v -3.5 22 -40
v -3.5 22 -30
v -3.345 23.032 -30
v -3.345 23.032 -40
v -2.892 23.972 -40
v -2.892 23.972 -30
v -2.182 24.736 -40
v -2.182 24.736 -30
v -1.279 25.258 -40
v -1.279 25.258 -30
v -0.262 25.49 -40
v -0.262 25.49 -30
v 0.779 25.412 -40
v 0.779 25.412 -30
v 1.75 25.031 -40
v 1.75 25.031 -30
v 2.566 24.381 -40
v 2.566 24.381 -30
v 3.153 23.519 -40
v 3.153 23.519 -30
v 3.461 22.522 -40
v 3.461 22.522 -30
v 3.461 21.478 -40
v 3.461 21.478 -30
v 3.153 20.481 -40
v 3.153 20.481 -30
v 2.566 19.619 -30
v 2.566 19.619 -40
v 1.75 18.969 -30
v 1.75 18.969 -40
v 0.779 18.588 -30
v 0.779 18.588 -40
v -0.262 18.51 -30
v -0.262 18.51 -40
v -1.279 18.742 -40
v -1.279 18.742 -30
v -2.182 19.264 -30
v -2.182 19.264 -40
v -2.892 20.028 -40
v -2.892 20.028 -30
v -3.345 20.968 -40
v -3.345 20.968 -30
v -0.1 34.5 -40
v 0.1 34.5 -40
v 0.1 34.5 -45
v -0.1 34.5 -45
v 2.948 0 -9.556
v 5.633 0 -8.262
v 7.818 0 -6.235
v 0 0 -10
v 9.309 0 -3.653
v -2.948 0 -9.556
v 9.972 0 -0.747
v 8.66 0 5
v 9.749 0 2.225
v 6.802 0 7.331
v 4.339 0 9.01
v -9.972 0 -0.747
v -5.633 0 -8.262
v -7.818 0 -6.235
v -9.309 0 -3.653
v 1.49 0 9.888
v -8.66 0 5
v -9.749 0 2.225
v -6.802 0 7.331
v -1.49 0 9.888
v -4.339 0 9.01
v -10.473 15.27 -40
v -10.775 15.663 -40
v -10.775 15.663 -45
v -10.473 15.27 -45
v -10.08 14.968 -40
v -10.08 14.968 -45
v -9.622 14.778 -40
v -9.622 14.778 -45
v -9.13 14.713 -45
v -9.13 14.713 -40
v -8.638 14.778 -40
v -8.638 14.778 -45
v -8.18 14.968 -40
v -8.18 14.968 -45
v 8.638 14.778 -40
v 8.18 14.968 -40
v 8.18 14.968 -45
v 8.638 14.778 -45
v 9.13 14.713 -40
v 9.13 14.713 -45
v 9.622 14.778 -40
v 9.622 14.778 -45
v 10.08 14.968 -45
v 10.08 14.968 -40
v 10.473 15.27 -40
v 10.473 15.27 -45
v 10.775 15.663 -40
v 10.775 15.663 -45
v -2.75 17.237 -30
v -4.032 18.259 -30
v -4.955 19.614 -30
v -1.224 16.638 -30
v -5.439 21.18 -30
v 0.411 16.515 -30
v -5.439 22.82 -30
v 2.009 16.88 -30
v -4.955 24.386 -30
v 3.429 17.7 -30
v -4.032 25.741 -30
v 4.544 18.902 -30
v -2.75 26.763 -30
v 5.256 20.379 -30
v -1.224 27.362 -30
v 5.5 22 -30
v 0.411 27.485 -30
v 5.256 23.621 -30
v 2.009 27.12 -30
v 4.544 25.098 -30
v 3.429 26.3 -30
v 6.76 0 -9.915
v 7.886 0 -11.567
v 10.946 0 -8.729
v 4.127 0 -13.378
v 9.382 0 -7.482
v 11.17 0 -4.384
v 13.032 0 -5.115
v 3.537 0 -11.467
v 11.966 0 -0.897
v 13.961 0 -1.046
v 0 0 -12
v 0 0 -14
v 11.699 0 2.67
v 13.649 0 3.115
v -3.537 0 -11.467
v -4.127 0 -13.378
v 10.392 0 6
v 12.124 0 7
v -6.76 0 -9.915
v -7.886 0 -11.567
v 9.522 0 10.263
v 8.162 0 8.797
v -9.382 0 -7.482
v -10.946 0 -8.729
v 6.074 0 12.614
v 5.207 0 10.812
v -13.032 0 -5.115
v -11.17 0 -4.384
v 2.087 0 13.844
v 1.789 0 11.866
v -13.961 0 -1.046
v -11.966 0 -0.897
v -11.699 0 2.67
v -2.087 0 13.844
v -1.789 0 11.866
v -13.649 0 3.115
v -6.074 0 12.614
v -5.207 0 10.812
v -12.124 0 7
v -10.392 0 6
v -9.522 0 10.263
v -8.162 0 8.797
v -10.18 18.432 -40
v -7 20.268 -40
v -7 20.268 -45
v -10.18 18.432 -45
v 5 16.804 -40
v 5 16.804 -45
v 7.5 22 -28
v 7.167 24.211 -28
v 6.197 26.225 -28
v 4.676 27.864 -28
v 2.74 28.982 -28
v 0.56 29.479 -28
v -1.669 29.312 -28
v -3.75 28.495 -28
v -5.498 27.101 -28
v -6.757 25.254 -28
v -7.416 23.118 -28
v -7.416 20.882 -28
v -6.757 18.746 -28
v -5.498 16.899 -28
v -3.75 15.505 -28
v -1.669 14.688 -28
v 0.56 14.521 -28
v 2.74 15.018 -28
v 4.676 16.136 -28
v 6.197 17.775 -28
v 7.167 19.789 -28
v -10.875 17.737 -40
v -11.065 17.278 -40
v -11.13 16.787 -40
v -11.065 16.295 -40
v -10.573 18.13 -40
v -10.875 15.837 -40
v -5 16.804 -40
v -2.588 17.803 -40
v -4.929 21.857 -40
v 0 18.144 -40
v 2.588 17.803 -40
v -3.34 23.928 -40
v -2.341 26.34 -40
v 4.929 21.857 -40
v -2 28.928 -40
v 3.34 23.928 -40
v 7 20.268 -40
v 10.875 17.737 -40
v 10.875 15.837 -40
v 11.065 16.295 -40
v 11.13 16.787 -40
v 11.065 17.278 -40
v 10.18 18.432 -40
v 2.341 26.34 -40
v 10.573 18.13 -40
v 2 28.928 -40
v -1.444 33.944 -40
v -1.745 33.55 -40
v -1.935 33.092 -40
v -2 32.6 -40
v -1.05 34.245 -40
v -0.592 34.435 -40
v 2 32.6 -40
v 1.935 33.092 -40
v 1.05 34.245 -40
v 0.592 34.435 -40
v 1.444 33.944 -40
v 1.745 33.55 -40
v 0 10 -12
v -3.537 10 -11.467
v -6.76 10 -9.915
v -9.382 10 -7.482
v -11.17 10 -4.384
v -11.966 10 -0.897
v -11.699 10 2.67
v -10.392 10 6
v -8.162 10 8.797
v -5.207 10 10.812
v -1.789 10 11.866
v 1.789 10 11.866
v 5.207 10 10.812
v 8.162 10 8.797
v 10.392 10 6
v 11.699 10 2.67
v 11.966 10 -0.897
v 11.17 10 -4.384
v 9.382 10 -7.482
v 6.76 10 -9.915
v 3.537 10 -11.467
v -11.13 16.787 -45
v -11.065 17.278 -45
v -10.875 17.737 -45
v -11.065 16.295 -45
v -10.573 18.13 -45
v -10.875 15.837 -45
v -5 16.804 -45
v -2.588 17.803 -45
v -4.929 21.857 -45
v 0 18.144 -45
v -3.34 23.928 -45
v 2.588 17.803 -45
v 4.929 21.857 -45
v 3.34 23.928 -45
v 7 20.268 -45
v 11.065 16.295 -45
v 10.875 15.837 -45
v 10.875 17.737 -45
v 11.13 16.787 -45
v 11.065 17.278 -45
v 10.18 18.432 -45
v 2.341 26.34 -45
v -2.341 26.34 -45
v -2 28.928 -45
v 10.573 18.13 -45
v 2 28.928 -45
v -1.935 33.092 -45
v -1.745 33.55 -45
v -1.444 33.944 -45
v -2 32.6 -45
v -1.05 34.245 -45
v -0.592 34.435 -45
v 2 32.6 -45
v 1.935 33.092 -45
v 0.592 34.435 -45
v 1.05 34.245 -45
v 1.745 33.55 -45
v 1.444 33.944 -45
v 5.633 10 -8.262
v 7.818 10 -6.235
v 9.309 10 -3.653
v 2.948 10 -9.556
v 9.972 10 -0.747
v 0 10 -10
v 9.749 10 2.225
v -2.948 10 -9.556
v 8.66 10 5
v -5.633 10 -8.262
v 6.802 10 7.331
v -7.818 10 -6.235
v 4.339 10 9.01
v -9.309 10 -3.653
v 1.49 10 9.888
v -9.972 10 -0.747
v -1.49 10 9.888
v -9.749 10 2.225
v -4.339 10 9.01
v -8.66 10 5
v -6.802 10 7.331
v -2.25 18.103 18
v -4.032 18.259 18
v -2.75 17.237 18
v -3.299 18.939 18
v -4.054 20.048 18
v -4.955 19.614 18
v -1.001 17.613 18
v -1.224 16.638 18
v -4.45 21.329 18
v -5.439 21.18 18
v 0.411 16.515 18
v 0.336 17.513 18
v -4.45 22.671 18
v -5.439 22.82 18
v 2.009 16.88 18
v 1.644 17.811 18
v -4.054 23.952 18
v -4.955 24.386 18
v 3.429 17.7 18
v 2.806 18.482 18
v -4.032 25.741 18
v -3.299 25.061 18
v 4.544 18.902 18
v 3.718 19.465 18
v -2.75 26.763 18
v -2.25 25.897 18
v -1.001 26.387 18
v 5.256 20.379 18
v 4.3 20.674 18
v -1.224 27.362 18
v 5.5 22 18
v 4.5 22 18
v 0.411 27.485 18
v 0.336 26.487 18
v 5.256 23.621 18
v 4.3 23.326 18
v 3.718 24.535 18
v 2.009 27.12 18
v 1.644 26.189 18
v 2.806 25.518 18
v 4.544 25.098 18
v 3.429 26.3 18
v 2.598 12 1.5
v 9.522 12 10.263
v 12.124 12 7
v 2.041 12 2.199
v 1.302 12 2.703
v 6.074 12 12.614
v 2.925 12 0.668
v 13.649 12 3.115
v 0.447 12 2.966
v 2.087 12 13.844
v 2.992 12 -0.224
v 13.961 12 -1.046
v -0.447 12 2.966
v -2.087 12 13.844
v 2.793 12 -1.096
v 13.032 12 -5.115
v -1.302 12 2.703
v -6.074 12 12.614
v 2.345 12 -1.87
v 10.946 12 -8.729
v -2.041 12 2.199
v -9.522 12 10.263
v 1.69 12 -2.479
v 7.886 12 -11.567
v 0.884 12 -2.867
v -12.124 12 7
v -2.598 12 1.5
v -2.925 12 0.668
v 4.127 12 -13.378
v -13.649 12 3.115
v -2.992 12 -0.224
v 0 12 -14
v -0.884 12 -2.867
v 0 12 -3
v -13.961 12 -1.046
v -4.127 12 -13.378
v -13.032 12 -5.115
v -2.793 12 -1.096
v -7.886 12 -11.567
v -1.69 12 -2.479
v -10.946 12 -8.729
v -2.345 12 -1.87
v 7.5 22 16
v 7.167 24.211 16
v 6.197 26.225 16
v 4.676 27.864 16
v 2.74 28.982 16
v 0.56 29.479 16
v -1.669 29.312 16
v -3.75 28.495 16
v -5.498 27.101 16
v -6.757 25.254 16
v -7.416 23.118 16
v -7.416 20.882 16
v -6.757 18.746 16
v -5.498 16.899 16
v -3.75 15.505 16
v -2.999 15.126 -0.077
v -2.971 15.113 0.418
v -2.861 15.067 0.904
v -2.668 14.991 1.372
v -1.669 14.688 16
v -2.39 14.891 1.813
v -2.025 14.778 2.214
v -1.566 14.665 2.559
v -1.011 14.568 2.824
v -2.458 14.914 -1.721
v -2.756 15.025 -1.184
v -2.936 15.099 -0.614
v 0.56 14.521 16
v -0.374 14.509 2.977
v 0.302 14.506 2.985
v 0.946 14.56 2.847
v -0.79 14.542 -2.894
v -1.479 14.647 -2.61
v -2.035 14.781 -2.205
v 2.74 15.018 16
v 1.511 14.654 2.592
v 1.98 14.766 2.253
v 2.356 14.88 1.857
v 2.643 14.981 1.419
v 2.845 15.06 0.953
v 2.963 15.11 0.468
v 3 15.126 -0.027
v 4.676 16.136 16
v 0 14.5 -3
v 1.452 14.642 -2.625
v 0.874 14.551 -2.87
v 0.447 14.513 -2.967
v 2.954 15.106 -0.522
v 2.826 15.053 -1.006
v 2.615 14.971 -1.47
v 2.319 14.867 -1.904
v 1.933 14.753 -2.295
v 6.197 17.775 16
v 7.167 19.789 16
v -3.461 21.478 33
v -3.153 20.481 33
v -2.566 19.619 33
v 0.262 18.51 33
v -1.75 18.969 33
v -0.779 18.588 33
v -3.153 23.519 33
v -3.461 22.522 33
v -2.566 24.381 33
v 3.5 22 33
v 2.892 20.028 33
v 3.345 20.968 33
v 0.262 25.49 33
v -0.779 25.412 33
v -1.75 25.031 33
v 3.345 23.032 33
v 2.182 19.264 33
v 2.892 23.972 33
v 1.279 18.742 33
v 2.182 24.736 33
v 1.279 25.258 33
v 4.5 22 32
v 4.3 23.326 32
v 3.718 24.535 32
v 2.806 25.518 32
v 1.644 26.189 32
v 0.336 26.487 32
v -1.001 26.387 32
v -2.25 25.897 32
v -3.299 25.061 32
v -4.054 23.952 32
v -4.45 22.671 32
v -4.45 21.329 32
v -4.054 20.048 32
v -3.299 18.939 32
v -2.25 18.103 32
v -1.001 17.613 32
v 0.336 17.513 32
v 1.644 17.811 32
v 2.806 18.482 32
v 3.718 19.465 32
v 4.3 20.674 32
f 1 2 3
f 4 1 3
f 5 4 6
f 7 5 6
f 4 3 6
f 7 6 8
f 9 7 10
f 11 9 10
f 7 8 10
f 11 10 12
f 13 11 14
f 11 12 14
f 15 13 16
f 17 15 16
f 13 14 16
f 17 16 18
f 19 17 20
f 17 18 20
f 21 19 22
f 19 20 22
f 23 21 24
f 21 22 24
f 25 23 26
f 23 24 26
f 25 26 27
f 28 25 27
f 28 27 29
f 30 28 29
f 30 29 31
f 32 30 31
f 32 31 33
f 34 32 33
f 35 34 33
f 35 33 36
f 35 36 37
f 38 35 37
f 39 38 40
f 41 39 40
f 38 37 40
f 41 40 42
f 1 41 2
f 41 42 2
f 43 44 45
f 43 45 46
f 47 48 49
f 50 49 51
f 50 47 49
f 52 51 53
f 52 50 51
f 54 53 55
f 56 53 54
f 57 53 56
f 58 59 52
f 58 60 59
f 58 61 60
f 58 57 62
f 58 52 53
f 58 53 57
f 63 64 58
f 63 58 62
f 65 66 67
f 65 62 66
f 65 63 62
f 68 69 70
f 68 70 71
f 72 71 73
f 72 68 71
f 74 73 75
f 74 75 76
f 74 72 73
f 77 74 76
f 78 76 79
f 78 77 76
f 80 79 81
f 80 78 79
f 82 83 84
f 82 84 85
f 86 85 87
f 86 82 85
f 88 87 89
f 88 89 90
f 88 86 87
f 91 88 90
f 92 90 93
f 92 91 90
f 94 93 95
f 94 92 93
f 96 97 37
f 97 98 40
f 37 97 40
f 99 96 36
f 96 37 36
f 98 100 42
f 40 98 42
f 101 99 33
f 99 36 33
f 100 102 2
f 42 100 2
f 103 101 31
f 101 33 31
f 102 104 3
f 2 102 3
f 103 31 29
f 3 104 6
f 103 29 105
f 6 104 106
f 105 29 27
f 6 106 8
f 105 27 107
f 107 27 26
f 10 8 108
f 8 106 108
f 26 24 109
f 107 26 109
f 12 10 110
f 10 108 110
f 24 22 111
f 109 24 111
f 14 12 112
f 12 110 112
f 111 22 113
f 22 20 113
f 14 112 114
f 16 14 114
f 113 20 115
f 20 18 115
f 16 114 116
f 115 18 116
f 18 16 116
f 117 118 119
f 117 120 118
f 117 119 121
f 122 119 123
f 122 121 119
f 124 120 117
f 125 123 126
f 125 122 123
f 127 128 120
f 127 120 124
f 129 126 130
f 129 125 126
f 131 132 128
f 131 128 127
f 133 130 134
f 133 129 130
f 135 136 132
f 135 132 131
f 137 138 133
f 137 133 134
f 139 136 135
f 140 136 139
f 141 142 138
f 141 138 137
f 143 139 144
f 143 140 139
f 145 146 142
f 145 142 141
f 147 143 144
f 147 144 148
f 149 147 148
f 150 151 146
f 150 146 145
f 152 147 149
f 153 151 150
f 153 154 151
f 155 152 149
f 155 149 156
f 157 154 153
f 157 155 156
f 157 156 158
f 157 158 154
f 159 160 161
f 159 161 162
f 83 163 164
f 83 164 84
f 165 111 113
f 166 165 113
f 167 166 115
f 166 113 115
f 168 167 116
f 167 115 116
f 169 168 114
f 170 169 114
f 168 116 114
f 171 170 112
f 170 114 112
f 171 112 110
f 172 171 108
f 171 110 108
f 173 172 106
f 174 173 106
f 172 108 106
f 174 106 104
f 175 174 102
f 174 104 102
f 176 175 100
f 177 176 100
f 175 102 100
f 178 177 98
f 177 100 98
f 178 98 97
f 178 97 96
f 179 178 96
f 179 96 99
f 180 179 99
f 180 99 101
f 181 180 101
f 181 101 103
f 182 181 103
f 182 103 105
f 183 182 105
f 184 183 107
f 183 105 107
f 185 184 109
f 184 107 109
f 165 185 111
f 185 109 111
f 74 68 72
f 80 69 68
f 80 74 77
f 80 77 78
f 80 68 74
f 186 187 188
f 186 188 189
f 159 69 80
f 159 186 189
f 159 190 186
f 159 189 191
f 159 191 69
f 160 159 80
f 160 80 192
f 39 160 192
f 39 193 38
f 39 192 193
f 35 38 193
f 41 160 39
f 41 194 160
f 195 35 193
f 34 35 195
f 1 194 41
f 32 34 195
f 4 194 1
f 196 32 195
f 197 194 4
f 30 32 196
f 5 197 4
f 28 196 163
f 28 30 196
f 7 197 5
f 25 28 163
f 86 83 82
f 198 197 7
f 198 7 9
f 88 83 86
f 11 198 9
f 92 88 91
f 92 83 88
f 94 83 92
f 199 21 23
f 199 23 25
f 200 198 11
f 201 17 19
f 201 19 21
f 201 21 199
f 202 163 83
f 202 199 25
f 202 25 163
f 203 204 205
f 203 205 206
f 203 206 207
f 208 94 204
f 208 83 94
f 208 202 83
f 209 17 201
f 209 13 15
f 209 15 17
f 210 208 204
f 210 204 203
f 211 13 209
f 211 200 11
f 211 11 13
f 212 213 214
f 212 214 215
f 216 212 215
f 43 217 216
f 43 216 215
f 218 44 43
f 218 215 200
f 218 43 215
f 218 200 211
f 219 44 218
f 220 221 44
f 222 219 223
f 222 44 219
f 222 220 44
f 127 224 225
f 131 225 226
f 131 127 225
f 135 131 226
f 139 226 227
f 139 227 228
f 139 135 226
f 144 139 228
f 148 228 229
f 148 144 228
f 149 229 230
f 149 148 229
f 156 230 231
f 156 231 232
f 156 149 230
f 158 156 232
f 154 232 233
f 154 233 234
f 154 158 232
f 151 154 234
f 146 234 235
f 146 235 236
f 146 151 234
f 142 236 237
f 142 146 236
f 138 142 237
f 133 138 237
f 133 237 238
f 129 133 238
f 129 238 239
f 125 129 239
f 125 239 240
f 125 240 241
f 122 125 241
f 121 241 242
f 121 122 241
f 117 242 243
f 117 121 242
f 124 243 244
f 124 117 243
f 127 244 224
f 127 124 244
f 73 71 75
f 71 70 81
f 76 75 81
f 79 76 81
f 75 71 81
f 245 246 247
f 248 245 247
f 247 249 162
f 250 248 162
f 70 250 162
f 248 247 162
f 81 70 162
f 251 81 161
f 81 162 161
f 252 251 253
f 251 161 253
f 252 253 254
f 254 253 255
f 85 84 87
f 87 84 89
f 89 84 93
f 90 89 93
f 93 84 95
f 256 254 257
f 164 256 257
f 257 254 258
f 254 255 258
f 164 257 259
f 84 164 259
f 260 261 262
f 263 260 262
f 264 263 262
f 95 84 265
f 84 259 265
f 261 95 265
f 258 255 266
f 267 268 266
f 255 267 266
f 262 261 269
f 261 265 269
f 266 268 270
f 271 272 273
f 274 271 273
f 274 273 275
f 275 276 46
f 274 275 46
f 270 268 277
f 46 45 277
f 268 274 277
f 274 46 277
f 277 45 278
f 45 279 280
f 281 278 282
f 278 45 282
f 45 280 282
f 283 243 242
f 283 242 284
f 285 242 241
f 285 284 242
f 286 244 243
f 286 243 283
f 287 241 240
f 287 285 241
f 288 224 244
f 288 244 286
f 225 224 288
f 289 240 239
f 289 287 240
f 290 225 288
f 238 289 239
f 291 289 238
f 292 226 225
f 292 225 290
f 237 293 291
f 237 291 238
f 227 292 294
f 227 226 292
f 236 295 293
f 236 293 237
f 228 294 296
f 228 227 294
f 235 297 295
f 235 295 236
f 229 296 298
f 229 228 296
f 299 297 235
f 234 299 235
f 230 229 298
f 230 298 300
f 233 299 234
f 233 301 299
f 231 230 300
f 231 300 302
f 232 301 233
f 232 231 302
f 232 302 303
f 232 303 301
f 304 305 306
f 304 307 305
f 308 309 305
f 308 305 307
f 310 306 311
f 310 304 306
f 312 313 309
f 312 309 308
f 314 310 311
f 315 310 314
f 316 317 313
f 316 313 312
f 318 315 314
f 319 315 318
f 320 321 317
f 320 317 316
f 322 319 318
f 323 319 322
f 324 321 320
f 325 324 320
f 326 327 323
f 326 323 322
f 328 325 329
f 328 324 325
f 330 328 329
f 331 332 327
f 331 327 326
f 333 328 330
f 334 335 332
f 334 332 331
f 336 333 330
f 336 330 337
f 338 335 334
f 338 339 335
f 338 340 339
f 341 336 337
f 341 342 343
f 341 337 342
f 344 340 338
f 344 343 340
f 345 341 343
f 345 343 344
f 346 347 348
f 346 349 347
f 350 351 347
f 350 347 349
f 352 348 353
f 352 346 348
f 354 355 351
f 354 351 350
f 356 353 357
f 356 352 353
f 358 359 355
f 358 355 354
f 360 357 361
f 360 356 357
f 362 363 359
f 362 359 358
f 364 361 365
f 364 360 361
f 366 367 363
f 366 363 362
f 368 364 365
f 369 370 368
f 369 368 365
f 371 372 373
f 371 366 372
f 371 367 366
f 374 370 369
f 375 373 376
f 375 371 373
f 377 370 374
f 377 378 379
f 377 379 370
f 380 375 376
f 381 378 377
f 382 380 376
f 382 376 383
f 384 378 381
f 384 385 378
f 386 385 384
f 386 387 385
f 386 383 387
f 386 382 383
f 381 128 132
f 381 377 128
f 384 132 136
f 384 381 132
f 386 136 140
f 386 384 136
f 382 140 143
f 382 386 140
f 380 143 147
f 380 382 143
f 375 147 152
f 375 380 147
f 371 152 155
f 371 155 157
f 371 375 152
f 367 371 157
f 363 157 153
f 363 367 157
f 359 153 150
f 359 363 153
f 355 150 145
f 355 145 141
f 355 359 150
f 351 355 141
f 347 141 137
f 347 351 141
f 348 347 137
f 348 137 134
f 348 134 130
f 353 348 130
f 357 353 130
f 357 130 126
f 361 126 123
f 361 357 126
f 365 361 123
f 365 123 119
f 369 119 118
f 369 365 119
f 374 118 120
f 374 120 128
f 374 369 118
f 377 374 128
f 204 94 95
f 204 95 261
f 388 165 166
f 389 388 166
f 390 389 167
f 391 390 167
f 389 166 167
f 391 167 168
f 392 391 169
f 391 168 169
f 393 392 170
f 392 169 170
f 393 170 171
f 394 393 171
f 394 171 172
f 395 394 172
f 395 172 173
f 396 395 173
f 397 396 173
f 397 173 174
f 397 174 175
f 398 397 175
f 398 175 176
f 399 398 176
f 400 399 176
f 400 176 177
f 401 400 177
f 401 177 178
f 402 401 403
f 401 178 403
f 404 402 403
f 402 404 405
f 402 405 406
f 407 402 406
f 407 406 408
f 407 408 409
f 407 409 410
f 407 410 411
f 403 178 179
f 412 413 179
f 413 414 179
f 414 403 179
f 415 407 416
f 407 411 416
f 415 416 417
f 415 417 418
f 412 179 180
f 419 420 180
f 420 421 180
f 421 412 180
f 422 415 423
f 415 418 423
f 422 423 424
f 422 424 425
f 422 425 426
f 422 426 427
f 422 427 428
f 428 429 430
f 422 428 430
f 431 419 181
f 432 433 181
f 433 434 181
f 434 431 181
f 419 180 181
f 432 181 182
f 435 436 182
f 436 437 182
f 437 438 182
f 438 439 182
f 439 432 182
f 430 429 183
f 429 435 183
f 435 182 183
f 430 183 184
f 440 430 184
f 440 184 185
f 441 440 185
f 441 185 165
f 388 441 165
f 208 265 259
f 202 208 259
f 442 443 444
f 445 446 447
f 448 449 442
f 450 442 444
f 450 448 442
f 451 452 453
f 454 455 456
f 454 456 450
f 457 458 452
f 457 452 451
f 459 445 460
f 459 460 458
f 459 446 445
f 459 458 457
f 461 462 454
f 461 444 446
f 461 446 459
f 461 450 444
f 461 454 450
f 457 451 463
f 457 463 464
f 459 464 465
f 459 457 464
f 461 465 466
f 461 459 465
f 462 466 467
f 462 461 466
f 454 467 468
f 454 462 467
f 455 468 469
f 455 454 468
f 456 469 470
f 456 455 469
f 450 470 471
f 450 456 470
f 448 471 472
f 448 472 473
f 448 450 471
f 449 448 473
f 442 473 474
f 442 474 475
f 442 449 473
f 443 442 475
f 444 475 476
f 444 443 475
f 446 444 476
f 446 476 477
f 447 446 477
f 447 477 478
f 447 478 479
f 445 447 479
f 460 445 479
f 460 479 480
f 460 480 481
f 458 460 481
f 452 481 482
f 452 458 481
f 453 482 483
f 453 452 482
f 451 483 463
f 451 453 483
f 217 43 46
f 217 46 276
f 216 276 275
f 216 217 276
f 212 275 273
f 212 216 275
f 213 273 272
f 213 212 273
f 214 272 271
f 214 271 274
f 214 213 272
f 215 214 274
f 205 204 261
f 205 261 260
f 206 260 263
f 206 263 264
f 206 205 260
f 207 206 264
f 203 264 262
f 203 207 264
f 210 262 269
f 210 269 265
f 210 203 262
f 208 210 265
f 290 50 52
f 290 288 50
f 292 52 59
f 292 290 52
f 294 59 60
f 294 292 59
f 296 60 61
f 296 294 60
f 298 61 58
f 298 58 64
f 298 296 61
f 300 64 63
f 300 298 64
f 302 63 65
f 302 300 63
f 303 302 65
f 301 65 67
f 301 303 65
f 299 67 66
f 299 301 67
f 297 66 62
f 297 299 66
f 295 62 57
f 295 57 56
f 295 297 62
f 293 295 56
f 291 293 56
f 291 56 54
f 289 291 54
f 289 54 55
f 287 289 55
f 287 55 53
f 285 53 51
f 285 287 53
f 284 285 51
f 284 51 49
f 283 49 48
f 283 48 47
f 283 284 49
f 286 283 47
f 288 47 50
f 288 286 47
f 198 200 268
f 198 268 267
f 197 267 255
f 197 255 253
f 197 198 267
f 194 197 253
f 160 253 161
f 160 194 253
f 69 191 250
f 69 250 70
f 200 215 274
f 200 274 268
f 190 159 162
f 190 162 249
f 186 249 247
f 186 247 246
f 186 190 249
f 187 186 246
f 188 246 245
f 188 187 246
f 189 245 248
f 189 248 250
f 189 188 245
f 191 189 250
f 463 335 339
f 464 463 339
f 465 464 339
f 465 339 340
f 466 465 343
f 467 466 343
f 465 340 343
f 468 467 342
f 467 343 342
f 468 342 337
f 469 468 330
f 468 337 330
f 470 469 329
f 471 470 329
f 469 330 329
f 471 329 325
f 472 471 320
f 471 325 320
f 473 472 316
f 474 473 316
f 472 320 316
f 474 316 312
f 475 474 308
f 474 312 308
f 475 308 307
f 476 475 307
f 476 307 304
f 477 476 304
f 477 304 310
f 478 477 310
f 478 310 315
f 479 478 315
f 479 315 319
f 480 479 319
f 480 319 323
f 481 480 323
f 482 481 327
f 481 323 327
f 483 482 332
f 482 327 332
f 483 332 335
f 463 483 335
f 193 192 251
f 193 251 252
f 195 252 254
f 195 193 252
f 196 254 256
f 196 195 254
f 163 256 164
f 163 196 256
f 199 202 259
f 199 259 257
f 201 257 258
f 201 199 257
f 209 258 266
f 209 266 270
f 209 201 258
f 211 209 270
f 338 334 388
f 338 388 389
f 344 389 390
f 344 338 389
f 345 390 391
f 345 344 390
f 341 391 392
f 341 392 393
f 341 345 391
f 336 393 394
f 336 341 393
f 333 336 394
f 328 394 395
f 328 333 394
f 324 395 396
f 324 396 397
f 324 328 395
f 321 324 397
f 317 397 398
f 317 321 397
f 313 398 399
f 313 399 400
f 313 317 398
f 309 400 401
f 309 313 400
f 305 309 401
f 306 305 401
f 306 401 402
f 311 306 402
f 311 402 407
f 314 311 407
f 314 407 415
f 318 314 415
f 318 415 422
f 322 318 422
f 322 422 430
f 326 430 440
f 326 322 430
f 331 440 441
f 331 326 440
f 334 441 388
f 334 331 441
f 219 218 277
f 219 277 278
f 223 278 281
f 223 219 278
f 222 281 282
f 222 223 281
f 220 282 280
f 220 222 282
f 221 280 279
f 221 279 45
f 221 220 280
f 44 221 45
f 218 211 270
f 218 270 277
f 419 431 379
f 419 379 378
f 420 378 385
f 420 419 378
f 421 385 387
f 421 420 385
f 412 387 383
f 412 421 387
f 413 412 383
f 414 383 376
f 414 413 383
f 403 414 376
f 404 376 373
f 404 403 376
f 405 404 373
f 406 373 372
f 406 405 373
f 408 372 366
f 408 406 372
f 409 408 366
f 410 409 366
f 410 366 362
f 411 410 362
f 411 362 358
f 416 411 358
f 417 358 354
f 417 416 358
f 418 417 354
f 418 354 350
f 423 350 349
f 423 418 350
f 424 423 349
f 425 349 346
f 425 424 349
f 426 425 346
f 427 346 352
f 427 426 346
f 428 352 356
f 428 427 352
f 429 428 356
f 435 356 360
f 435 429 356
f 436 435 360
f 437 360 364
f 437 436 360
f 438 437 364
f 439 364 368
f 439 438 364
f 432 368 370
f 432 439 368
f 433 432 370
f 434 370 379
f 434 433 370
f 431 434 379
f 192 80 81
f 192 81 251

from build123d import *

# Parameters (mm, degrees)
BOSS_EXTRU_1_DEPTH      = 18
BOSS_EXTRU_1_DEPTH_BACK = 30
ESQUISSE2_R             = 7.5
CHANFREIN1_SIZE         = 2
ESQUISSE3_R             = 4.5
BOSS_EXTRU_2_DEPTH      = 15
CHANFREIN2_SIZE         = 1
ESQUISSE4_R             = 3.5
BOSS_EXTRU_3_DEPTH      = 10
BOSS_EXTRU_4_DEPTH      = 5


with BuildPart() as part:
    # Esquisse1 → Révolution1 (revolve)
    with BuildSketch(Plane.XY, mode=Mode.PRIVATE) as r_volution1_sk:
        Polygon((-12, 0), (-14, 0), (-14, 12), (-3, 12), (-3, 18), (0, 18), (0, 0), (-10, 0), (-10, 10), (-12, 10), align=None)
    revolve(r_volution1_sk.sketch.rotate(Axis((0, 0, 0), (0, 1, 0)), 270), axis=Axis((0, 0, 0), (0, 1, 0)))

    # Esquisse2 → Boss.-Extru.1 (add, two sides: drawn at the far end of the back side and taken through both)
    with BuildSketch(Plane.XY.offset(-BOSS_EXTRU_1_DEPTH_BACK)):
        with Locations((0, 22)):
            Circle(ESQUISSE2_R)
    extrude(amount=BOSS_EXTRU_1_DEPTH + BOSS_EXTRU_1_DEPTH_BACK)

    # Chanfrein1
    chanfrein1_edges = [part.edges().sort_by_distance(p)[0] for p in [
        (-7.5, 22, -30),
        (-7.5, 22, 18),
    ]]
    chamfer(chanfrein1_edges, length=CHANFREIN1_SIZE)

    # Esquisse3 → Boss.-Extru.2 (add)
    with BuildSketch(Plane.XY.offset(18)):
        with Locations((0, 22)):
            Circle(ESQUISSE3_R)
    extrude(amount=BOSS_EXTRU_2_DEPTH)

    # Chanfrein2
    chanfrein2_edges = [part.edges().sort_by_distance(p)[0] for p in [
        (-4.5, 22, 33),
    ]]
    chamfer(chanfrein2_edges, length=CHANFREIN2_SIZE)

    # Esquisse4 → Boss.-Extru.3 (add)
    with BuildSketch(Plane(origin=(0, 0, -30), x_dir=(-1, 0, 0), z_dir=(0, 0, -1))):
        with Locations((0, 22)):
            Circle(ESQUISSE4_R)
    extrude(amount=BOSS_EXTRU_3_DEPTH)

    # Esquisse5 → Boss.-Extru.4 (add)
    with BuildSketch(Plane(origin=(0, 0, -40), x_dir=(-1, 0, 0), z_dir=(0, 0, -1))):
        with BuildLine():
            Line((-2, 28.92820323), (-2, 32.6))
            ThreePointArc((-2, 32.6), (-1.443502884, 33.943502884), (-0.1, 34.5))
            Line((-0.1, 34.5), (0.1, 34.5))
            ThreePointArc((0.1, 34.5), (1.443502884, 33.943502884), (2, 32.6))
            Line((2, 32.6), (2, 28.92820323))
            ThreePointArc((2, 28.92820323), (3.339745962, 23.92820323), (7, 20.267949192))
            Line((7, 20.267949192), (10.17986928, 18.432050808))
            ThreePointArc((10.17986928, 18.432050808), (11.06512835, 17.278358726), (10.875317547, 15.83660254))
            Line((10.875317547, 15.83660254), (10.775317547, 15.66339746))
            ThreePointArc((10.775317547, 15.66339746), (9.621625466, 14.77813839), (8.17986928, 14.967949192))
            Line((8.17986928, 14.967949192), (5, 16.803847577))
            ThreePointArc((5, 16.803847577), (0, 18.143593539), (-5, 16.803847577))
            Line((-5, 16.803847577), (-8.17986928, 14.967949192))
            ThreePointArc((-8.17986928, 14.967949192), (-9.621625466, 14.77813839), (-10.775317547, 15.66339746))
            Line((-10.775317547, 15.66339746), (-10.875317547, 15.83660254))
            ThreePointArc((-10.875317547, 15.83660254), (-11.06512835, 17.278358726), (-10.17986928, 18.432050808))
            Line((-10.17986928, 18.432050808), (-7, 20.267949192))
            ThreePointArc((-7, 20.267949192), (-3.339745962, 23.92820323), (-2, 28.92820323))
        make_face()
    extrude(amount=BOSS_EXTRU_4_DEPTH)


solid = part.part
